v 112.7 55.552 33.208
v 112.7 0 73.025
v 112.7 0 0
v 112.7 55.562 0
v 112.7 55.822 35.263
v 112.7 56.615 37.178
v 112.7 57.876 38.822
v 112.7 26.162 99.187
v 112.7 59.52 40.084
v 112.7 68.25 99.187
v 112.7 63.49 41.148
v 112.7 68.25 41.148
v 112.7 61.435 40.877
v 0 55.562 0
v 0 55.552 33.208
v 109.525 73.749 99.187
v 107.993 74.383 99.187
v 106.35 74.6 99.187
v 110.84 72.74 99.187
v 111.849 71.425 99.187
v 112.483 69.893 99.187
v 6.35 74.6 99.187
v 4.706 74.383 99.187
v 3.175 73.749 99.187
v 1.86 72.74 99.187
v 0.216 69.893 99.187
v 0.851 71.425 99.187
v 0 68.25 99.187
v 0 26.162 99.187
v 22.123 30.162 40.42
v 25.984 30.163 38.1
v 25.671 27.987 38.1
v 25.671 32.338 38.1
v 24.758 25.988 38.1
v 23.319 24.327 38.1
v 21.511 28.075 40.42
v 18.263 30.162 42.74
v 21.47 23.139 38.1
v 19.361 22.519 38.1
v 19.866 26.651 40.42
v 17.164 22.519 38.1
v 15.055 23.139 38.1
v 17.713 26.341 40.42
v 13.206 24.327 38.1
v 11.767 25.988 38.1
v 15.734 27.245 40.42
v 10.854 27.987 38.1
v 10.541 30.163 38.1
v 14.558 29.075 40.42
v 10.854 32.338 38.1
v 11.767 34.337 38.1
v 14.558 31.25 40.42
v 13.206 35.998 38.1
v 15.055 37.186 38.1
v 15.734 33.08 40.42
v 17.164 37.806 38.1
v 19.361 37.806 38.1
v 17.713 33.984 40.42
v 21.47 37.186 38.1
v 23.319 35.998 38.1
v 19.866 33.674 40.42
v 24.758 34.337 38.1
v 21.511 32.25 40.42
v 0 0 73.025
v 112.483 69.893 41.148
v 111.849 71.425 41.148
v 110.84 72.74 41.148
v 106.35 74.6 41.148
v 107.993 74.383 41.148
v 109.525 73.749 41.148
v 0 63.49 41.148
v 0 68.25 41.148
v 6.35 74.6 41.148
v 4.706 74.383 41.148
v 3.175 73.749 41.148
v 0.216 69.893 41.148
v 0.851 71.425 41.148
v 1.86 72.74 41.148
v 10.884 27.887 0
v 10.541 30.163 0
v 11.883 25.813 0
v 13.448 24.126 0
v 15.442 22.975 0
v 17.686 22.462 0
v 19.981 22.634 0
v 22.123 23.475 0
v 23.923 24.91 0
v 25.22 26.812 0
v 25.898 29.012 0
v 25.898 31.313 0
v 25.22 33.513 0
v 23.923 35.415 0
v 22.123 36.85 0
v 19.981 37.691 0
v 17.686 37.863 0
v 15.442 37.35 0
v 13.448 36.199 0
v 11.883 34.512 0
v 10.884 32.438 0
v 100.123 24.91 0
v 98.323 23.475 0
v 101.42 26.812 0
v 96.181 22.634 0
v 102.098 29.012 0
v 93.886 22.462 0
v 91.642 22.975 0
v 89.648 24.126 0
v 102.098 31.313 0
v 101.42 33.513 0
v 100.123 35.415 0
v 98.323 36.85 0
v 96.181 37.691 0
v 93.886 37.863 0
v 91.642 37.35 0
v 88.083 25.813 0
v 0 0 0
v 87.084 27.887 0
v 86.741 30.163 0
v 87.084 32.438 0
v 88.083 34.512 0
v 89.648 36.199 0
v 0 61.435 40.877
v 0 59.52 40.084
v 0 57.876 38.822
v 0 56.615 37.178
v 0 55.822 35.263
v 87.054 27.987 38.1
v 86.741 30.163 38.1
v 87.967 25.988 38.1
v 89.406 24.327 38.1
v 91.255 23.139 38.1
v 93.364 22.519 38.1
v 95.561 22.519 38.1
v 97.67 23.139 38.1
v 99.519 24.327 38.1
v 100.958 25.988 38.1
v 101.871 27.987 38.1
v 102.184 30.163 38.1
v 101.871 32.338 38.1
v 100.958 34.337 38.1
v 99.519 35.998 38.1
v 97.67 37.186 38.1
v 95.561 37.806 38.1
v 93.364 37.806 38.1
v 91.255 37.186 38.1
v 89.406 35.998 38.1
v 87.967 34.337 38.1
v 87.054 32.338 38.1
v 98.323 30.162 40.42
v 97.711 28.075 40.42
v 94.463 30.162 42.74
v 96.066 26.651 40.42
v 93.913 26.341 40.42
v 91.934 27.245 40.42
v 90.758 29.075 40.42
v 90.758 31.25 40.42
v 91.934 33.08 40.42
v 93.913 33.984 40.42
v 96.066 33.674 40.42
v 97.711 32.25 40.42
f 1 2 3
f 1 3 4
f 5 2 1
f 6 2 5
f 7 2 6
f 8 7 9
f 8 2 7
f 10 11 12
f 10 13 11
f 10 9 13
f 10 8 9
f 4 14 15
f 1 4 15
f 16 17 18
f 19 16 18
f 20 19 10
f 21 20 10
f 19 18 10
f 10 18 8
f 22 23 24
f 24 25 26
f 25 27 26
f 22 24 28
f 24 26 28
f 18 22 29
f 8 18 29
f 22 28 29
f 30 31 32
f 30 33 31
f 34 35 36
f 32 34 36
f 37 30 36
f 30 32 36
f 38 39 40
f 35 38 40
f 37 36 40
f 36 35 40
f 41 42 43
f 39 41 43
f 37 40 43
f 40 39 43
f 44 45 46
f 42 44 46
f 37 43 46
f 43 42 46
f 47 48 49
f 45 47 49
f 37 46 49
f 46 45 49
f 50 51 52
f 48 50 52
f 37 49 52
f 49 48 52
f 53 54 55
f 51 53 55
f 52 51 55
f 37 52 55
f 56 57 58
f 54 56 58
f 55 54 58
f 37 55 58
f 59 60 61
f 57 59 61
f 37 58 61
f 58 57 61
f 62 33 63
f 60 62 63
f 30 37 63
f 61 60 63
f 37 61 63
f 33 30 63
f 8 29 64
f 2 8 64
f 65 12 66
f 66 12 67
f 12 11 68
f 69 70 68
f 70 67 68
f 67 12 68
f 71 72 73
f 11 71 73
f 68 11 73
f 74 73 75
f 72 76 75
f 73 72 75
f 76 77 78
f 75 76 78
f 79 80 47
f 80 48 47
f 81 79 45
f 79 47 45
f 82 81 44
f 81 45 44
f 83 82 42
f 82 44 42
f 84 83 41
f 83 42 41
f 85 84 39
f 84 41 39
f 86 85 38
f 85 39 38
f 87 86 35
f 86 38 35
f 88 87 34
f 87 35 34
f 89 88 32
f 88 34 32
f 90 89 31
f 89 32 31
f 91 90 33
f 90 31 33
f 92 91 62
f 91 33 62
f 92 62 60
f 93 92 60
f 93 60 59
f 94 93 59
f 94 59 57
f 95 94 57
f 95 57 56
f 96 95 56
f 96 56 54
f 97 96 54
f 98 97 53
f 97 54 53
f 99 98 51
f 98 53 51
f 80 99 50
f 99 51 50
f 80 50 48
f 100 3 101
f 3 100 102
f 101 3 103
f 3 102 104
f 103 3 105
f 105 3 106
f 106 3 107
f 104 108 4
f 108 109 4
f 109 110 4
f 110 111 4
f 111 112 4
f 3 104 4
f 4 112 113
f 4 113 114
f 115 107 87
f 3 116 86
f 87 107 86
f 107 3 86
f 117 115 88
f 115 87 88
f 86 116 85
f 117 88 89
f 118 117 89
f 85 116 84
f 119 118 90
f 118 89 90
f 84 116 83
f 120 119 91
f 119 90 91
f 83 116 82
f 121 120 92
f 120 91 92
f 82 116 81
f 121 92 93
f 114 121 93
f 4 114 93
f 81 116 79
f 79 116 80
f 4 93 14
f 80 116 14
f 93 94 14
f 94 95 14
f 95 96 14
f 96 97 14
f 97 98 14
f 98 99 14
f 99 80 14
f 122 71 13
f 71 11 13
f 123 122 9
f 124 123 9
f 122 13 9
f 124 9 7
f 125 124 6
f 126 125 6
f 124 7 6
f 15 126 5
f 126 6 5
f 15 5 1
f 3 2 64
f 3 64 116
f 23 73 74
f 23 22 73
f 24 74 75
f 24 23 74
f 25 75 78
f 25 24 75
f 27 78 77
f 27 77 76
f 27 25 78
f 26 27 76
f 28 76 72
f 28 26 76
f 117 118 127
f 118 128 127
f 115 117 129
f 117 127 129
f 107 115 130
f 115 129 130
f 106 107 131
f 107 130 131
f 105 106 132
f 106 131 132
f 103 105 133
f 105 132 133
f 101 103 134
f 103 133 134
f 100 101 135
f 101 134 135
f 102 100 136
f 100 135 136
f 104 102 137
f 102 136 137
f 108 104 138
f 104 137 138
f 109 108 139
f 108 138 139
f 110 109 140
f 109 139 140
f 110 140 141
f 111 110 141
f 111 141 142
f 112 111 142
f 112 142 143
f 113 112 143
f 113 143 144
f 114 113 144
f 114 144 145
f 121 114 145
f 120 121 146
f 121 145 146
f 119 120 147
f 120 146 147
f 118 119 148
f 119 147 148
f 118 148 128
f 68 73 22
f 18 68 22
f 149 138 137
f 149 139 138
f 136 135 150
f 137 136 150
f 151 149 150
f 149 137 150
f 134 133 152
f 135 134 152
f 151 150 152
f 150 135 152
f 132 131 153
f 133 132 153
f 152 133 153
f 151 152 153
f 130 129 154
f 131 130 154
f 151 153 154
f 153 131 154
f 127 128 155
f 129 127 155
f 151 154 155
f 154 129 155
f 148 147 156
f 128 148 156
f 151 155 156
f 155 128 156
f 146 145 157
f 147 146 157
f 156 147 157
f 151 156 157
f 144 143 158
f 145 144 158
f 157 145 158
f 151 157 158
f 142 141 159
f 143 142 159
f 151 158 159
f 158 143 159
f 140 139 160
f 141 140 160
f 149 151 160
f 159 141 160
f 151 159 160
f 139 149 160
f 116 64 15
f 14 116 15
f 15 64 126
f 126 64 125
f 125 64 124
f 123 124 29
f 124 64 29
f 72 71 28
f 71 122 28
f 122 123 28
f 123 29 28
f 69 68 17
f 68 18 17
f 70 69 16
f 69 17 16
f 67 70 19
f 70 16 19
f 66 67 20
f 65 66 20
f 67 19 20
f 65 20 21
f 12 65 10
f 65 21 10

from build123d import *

# Parameters (mm, degrees)
F1_DEPTH = 112.6998
F3_D     = 15.4432
F3_DEPTH = 38.1
F3_TIP   = 4.6396053559
F4_R     = 6.35
F5_R     = 7.9375


with BuildPart() as f1:
    # F0 (on Right) → F1 (new body)
    with BuildSketch(Plane.YZ):
        Polygon((74.5998005843, 99.187), (26.162, 99.187), (0, 73.025), (0, 0), (55.5625, 0), (55.5497996769, 41.148), (74.5998005843, 41.148), align=None)
    extrude(amount=F1_DEPTH)

    # F3
    with Locations(Plane(origin=(0, 0, 0), x_dir=(1, 0, 0), z_dir=(0, 0, -1))):
        with Locations((94.4626, -30.1625), (18.2626, -30.1625)):
            Hole(F3_D / 2, depth=F3_DEPTH)
            with Locations((0, 0, -(F3_DEPTH + F3_TIP / 2))):  # 118° drill point
                Cone(0, F3_D / 2, F3_TIP, mode=Mode.SUBTRACT)

    # F4
    f4_edges = [f1.edges().sort_by_distance(p)[0] for p in [
        (112.6998, 74.599801, 70.1675),
        (0, 74.599801, 70.1675),
    ]]
    fillet(f4_edges, radius=F4_R)

    # F5
    f5_edges = [f1.edges().sort_by_distance(p)[0] for p in [
        (56.3499, 55.5498, 41.148),
    ]]
    fillet(f5_edges, radius=F5_R)


solid = f1.part
